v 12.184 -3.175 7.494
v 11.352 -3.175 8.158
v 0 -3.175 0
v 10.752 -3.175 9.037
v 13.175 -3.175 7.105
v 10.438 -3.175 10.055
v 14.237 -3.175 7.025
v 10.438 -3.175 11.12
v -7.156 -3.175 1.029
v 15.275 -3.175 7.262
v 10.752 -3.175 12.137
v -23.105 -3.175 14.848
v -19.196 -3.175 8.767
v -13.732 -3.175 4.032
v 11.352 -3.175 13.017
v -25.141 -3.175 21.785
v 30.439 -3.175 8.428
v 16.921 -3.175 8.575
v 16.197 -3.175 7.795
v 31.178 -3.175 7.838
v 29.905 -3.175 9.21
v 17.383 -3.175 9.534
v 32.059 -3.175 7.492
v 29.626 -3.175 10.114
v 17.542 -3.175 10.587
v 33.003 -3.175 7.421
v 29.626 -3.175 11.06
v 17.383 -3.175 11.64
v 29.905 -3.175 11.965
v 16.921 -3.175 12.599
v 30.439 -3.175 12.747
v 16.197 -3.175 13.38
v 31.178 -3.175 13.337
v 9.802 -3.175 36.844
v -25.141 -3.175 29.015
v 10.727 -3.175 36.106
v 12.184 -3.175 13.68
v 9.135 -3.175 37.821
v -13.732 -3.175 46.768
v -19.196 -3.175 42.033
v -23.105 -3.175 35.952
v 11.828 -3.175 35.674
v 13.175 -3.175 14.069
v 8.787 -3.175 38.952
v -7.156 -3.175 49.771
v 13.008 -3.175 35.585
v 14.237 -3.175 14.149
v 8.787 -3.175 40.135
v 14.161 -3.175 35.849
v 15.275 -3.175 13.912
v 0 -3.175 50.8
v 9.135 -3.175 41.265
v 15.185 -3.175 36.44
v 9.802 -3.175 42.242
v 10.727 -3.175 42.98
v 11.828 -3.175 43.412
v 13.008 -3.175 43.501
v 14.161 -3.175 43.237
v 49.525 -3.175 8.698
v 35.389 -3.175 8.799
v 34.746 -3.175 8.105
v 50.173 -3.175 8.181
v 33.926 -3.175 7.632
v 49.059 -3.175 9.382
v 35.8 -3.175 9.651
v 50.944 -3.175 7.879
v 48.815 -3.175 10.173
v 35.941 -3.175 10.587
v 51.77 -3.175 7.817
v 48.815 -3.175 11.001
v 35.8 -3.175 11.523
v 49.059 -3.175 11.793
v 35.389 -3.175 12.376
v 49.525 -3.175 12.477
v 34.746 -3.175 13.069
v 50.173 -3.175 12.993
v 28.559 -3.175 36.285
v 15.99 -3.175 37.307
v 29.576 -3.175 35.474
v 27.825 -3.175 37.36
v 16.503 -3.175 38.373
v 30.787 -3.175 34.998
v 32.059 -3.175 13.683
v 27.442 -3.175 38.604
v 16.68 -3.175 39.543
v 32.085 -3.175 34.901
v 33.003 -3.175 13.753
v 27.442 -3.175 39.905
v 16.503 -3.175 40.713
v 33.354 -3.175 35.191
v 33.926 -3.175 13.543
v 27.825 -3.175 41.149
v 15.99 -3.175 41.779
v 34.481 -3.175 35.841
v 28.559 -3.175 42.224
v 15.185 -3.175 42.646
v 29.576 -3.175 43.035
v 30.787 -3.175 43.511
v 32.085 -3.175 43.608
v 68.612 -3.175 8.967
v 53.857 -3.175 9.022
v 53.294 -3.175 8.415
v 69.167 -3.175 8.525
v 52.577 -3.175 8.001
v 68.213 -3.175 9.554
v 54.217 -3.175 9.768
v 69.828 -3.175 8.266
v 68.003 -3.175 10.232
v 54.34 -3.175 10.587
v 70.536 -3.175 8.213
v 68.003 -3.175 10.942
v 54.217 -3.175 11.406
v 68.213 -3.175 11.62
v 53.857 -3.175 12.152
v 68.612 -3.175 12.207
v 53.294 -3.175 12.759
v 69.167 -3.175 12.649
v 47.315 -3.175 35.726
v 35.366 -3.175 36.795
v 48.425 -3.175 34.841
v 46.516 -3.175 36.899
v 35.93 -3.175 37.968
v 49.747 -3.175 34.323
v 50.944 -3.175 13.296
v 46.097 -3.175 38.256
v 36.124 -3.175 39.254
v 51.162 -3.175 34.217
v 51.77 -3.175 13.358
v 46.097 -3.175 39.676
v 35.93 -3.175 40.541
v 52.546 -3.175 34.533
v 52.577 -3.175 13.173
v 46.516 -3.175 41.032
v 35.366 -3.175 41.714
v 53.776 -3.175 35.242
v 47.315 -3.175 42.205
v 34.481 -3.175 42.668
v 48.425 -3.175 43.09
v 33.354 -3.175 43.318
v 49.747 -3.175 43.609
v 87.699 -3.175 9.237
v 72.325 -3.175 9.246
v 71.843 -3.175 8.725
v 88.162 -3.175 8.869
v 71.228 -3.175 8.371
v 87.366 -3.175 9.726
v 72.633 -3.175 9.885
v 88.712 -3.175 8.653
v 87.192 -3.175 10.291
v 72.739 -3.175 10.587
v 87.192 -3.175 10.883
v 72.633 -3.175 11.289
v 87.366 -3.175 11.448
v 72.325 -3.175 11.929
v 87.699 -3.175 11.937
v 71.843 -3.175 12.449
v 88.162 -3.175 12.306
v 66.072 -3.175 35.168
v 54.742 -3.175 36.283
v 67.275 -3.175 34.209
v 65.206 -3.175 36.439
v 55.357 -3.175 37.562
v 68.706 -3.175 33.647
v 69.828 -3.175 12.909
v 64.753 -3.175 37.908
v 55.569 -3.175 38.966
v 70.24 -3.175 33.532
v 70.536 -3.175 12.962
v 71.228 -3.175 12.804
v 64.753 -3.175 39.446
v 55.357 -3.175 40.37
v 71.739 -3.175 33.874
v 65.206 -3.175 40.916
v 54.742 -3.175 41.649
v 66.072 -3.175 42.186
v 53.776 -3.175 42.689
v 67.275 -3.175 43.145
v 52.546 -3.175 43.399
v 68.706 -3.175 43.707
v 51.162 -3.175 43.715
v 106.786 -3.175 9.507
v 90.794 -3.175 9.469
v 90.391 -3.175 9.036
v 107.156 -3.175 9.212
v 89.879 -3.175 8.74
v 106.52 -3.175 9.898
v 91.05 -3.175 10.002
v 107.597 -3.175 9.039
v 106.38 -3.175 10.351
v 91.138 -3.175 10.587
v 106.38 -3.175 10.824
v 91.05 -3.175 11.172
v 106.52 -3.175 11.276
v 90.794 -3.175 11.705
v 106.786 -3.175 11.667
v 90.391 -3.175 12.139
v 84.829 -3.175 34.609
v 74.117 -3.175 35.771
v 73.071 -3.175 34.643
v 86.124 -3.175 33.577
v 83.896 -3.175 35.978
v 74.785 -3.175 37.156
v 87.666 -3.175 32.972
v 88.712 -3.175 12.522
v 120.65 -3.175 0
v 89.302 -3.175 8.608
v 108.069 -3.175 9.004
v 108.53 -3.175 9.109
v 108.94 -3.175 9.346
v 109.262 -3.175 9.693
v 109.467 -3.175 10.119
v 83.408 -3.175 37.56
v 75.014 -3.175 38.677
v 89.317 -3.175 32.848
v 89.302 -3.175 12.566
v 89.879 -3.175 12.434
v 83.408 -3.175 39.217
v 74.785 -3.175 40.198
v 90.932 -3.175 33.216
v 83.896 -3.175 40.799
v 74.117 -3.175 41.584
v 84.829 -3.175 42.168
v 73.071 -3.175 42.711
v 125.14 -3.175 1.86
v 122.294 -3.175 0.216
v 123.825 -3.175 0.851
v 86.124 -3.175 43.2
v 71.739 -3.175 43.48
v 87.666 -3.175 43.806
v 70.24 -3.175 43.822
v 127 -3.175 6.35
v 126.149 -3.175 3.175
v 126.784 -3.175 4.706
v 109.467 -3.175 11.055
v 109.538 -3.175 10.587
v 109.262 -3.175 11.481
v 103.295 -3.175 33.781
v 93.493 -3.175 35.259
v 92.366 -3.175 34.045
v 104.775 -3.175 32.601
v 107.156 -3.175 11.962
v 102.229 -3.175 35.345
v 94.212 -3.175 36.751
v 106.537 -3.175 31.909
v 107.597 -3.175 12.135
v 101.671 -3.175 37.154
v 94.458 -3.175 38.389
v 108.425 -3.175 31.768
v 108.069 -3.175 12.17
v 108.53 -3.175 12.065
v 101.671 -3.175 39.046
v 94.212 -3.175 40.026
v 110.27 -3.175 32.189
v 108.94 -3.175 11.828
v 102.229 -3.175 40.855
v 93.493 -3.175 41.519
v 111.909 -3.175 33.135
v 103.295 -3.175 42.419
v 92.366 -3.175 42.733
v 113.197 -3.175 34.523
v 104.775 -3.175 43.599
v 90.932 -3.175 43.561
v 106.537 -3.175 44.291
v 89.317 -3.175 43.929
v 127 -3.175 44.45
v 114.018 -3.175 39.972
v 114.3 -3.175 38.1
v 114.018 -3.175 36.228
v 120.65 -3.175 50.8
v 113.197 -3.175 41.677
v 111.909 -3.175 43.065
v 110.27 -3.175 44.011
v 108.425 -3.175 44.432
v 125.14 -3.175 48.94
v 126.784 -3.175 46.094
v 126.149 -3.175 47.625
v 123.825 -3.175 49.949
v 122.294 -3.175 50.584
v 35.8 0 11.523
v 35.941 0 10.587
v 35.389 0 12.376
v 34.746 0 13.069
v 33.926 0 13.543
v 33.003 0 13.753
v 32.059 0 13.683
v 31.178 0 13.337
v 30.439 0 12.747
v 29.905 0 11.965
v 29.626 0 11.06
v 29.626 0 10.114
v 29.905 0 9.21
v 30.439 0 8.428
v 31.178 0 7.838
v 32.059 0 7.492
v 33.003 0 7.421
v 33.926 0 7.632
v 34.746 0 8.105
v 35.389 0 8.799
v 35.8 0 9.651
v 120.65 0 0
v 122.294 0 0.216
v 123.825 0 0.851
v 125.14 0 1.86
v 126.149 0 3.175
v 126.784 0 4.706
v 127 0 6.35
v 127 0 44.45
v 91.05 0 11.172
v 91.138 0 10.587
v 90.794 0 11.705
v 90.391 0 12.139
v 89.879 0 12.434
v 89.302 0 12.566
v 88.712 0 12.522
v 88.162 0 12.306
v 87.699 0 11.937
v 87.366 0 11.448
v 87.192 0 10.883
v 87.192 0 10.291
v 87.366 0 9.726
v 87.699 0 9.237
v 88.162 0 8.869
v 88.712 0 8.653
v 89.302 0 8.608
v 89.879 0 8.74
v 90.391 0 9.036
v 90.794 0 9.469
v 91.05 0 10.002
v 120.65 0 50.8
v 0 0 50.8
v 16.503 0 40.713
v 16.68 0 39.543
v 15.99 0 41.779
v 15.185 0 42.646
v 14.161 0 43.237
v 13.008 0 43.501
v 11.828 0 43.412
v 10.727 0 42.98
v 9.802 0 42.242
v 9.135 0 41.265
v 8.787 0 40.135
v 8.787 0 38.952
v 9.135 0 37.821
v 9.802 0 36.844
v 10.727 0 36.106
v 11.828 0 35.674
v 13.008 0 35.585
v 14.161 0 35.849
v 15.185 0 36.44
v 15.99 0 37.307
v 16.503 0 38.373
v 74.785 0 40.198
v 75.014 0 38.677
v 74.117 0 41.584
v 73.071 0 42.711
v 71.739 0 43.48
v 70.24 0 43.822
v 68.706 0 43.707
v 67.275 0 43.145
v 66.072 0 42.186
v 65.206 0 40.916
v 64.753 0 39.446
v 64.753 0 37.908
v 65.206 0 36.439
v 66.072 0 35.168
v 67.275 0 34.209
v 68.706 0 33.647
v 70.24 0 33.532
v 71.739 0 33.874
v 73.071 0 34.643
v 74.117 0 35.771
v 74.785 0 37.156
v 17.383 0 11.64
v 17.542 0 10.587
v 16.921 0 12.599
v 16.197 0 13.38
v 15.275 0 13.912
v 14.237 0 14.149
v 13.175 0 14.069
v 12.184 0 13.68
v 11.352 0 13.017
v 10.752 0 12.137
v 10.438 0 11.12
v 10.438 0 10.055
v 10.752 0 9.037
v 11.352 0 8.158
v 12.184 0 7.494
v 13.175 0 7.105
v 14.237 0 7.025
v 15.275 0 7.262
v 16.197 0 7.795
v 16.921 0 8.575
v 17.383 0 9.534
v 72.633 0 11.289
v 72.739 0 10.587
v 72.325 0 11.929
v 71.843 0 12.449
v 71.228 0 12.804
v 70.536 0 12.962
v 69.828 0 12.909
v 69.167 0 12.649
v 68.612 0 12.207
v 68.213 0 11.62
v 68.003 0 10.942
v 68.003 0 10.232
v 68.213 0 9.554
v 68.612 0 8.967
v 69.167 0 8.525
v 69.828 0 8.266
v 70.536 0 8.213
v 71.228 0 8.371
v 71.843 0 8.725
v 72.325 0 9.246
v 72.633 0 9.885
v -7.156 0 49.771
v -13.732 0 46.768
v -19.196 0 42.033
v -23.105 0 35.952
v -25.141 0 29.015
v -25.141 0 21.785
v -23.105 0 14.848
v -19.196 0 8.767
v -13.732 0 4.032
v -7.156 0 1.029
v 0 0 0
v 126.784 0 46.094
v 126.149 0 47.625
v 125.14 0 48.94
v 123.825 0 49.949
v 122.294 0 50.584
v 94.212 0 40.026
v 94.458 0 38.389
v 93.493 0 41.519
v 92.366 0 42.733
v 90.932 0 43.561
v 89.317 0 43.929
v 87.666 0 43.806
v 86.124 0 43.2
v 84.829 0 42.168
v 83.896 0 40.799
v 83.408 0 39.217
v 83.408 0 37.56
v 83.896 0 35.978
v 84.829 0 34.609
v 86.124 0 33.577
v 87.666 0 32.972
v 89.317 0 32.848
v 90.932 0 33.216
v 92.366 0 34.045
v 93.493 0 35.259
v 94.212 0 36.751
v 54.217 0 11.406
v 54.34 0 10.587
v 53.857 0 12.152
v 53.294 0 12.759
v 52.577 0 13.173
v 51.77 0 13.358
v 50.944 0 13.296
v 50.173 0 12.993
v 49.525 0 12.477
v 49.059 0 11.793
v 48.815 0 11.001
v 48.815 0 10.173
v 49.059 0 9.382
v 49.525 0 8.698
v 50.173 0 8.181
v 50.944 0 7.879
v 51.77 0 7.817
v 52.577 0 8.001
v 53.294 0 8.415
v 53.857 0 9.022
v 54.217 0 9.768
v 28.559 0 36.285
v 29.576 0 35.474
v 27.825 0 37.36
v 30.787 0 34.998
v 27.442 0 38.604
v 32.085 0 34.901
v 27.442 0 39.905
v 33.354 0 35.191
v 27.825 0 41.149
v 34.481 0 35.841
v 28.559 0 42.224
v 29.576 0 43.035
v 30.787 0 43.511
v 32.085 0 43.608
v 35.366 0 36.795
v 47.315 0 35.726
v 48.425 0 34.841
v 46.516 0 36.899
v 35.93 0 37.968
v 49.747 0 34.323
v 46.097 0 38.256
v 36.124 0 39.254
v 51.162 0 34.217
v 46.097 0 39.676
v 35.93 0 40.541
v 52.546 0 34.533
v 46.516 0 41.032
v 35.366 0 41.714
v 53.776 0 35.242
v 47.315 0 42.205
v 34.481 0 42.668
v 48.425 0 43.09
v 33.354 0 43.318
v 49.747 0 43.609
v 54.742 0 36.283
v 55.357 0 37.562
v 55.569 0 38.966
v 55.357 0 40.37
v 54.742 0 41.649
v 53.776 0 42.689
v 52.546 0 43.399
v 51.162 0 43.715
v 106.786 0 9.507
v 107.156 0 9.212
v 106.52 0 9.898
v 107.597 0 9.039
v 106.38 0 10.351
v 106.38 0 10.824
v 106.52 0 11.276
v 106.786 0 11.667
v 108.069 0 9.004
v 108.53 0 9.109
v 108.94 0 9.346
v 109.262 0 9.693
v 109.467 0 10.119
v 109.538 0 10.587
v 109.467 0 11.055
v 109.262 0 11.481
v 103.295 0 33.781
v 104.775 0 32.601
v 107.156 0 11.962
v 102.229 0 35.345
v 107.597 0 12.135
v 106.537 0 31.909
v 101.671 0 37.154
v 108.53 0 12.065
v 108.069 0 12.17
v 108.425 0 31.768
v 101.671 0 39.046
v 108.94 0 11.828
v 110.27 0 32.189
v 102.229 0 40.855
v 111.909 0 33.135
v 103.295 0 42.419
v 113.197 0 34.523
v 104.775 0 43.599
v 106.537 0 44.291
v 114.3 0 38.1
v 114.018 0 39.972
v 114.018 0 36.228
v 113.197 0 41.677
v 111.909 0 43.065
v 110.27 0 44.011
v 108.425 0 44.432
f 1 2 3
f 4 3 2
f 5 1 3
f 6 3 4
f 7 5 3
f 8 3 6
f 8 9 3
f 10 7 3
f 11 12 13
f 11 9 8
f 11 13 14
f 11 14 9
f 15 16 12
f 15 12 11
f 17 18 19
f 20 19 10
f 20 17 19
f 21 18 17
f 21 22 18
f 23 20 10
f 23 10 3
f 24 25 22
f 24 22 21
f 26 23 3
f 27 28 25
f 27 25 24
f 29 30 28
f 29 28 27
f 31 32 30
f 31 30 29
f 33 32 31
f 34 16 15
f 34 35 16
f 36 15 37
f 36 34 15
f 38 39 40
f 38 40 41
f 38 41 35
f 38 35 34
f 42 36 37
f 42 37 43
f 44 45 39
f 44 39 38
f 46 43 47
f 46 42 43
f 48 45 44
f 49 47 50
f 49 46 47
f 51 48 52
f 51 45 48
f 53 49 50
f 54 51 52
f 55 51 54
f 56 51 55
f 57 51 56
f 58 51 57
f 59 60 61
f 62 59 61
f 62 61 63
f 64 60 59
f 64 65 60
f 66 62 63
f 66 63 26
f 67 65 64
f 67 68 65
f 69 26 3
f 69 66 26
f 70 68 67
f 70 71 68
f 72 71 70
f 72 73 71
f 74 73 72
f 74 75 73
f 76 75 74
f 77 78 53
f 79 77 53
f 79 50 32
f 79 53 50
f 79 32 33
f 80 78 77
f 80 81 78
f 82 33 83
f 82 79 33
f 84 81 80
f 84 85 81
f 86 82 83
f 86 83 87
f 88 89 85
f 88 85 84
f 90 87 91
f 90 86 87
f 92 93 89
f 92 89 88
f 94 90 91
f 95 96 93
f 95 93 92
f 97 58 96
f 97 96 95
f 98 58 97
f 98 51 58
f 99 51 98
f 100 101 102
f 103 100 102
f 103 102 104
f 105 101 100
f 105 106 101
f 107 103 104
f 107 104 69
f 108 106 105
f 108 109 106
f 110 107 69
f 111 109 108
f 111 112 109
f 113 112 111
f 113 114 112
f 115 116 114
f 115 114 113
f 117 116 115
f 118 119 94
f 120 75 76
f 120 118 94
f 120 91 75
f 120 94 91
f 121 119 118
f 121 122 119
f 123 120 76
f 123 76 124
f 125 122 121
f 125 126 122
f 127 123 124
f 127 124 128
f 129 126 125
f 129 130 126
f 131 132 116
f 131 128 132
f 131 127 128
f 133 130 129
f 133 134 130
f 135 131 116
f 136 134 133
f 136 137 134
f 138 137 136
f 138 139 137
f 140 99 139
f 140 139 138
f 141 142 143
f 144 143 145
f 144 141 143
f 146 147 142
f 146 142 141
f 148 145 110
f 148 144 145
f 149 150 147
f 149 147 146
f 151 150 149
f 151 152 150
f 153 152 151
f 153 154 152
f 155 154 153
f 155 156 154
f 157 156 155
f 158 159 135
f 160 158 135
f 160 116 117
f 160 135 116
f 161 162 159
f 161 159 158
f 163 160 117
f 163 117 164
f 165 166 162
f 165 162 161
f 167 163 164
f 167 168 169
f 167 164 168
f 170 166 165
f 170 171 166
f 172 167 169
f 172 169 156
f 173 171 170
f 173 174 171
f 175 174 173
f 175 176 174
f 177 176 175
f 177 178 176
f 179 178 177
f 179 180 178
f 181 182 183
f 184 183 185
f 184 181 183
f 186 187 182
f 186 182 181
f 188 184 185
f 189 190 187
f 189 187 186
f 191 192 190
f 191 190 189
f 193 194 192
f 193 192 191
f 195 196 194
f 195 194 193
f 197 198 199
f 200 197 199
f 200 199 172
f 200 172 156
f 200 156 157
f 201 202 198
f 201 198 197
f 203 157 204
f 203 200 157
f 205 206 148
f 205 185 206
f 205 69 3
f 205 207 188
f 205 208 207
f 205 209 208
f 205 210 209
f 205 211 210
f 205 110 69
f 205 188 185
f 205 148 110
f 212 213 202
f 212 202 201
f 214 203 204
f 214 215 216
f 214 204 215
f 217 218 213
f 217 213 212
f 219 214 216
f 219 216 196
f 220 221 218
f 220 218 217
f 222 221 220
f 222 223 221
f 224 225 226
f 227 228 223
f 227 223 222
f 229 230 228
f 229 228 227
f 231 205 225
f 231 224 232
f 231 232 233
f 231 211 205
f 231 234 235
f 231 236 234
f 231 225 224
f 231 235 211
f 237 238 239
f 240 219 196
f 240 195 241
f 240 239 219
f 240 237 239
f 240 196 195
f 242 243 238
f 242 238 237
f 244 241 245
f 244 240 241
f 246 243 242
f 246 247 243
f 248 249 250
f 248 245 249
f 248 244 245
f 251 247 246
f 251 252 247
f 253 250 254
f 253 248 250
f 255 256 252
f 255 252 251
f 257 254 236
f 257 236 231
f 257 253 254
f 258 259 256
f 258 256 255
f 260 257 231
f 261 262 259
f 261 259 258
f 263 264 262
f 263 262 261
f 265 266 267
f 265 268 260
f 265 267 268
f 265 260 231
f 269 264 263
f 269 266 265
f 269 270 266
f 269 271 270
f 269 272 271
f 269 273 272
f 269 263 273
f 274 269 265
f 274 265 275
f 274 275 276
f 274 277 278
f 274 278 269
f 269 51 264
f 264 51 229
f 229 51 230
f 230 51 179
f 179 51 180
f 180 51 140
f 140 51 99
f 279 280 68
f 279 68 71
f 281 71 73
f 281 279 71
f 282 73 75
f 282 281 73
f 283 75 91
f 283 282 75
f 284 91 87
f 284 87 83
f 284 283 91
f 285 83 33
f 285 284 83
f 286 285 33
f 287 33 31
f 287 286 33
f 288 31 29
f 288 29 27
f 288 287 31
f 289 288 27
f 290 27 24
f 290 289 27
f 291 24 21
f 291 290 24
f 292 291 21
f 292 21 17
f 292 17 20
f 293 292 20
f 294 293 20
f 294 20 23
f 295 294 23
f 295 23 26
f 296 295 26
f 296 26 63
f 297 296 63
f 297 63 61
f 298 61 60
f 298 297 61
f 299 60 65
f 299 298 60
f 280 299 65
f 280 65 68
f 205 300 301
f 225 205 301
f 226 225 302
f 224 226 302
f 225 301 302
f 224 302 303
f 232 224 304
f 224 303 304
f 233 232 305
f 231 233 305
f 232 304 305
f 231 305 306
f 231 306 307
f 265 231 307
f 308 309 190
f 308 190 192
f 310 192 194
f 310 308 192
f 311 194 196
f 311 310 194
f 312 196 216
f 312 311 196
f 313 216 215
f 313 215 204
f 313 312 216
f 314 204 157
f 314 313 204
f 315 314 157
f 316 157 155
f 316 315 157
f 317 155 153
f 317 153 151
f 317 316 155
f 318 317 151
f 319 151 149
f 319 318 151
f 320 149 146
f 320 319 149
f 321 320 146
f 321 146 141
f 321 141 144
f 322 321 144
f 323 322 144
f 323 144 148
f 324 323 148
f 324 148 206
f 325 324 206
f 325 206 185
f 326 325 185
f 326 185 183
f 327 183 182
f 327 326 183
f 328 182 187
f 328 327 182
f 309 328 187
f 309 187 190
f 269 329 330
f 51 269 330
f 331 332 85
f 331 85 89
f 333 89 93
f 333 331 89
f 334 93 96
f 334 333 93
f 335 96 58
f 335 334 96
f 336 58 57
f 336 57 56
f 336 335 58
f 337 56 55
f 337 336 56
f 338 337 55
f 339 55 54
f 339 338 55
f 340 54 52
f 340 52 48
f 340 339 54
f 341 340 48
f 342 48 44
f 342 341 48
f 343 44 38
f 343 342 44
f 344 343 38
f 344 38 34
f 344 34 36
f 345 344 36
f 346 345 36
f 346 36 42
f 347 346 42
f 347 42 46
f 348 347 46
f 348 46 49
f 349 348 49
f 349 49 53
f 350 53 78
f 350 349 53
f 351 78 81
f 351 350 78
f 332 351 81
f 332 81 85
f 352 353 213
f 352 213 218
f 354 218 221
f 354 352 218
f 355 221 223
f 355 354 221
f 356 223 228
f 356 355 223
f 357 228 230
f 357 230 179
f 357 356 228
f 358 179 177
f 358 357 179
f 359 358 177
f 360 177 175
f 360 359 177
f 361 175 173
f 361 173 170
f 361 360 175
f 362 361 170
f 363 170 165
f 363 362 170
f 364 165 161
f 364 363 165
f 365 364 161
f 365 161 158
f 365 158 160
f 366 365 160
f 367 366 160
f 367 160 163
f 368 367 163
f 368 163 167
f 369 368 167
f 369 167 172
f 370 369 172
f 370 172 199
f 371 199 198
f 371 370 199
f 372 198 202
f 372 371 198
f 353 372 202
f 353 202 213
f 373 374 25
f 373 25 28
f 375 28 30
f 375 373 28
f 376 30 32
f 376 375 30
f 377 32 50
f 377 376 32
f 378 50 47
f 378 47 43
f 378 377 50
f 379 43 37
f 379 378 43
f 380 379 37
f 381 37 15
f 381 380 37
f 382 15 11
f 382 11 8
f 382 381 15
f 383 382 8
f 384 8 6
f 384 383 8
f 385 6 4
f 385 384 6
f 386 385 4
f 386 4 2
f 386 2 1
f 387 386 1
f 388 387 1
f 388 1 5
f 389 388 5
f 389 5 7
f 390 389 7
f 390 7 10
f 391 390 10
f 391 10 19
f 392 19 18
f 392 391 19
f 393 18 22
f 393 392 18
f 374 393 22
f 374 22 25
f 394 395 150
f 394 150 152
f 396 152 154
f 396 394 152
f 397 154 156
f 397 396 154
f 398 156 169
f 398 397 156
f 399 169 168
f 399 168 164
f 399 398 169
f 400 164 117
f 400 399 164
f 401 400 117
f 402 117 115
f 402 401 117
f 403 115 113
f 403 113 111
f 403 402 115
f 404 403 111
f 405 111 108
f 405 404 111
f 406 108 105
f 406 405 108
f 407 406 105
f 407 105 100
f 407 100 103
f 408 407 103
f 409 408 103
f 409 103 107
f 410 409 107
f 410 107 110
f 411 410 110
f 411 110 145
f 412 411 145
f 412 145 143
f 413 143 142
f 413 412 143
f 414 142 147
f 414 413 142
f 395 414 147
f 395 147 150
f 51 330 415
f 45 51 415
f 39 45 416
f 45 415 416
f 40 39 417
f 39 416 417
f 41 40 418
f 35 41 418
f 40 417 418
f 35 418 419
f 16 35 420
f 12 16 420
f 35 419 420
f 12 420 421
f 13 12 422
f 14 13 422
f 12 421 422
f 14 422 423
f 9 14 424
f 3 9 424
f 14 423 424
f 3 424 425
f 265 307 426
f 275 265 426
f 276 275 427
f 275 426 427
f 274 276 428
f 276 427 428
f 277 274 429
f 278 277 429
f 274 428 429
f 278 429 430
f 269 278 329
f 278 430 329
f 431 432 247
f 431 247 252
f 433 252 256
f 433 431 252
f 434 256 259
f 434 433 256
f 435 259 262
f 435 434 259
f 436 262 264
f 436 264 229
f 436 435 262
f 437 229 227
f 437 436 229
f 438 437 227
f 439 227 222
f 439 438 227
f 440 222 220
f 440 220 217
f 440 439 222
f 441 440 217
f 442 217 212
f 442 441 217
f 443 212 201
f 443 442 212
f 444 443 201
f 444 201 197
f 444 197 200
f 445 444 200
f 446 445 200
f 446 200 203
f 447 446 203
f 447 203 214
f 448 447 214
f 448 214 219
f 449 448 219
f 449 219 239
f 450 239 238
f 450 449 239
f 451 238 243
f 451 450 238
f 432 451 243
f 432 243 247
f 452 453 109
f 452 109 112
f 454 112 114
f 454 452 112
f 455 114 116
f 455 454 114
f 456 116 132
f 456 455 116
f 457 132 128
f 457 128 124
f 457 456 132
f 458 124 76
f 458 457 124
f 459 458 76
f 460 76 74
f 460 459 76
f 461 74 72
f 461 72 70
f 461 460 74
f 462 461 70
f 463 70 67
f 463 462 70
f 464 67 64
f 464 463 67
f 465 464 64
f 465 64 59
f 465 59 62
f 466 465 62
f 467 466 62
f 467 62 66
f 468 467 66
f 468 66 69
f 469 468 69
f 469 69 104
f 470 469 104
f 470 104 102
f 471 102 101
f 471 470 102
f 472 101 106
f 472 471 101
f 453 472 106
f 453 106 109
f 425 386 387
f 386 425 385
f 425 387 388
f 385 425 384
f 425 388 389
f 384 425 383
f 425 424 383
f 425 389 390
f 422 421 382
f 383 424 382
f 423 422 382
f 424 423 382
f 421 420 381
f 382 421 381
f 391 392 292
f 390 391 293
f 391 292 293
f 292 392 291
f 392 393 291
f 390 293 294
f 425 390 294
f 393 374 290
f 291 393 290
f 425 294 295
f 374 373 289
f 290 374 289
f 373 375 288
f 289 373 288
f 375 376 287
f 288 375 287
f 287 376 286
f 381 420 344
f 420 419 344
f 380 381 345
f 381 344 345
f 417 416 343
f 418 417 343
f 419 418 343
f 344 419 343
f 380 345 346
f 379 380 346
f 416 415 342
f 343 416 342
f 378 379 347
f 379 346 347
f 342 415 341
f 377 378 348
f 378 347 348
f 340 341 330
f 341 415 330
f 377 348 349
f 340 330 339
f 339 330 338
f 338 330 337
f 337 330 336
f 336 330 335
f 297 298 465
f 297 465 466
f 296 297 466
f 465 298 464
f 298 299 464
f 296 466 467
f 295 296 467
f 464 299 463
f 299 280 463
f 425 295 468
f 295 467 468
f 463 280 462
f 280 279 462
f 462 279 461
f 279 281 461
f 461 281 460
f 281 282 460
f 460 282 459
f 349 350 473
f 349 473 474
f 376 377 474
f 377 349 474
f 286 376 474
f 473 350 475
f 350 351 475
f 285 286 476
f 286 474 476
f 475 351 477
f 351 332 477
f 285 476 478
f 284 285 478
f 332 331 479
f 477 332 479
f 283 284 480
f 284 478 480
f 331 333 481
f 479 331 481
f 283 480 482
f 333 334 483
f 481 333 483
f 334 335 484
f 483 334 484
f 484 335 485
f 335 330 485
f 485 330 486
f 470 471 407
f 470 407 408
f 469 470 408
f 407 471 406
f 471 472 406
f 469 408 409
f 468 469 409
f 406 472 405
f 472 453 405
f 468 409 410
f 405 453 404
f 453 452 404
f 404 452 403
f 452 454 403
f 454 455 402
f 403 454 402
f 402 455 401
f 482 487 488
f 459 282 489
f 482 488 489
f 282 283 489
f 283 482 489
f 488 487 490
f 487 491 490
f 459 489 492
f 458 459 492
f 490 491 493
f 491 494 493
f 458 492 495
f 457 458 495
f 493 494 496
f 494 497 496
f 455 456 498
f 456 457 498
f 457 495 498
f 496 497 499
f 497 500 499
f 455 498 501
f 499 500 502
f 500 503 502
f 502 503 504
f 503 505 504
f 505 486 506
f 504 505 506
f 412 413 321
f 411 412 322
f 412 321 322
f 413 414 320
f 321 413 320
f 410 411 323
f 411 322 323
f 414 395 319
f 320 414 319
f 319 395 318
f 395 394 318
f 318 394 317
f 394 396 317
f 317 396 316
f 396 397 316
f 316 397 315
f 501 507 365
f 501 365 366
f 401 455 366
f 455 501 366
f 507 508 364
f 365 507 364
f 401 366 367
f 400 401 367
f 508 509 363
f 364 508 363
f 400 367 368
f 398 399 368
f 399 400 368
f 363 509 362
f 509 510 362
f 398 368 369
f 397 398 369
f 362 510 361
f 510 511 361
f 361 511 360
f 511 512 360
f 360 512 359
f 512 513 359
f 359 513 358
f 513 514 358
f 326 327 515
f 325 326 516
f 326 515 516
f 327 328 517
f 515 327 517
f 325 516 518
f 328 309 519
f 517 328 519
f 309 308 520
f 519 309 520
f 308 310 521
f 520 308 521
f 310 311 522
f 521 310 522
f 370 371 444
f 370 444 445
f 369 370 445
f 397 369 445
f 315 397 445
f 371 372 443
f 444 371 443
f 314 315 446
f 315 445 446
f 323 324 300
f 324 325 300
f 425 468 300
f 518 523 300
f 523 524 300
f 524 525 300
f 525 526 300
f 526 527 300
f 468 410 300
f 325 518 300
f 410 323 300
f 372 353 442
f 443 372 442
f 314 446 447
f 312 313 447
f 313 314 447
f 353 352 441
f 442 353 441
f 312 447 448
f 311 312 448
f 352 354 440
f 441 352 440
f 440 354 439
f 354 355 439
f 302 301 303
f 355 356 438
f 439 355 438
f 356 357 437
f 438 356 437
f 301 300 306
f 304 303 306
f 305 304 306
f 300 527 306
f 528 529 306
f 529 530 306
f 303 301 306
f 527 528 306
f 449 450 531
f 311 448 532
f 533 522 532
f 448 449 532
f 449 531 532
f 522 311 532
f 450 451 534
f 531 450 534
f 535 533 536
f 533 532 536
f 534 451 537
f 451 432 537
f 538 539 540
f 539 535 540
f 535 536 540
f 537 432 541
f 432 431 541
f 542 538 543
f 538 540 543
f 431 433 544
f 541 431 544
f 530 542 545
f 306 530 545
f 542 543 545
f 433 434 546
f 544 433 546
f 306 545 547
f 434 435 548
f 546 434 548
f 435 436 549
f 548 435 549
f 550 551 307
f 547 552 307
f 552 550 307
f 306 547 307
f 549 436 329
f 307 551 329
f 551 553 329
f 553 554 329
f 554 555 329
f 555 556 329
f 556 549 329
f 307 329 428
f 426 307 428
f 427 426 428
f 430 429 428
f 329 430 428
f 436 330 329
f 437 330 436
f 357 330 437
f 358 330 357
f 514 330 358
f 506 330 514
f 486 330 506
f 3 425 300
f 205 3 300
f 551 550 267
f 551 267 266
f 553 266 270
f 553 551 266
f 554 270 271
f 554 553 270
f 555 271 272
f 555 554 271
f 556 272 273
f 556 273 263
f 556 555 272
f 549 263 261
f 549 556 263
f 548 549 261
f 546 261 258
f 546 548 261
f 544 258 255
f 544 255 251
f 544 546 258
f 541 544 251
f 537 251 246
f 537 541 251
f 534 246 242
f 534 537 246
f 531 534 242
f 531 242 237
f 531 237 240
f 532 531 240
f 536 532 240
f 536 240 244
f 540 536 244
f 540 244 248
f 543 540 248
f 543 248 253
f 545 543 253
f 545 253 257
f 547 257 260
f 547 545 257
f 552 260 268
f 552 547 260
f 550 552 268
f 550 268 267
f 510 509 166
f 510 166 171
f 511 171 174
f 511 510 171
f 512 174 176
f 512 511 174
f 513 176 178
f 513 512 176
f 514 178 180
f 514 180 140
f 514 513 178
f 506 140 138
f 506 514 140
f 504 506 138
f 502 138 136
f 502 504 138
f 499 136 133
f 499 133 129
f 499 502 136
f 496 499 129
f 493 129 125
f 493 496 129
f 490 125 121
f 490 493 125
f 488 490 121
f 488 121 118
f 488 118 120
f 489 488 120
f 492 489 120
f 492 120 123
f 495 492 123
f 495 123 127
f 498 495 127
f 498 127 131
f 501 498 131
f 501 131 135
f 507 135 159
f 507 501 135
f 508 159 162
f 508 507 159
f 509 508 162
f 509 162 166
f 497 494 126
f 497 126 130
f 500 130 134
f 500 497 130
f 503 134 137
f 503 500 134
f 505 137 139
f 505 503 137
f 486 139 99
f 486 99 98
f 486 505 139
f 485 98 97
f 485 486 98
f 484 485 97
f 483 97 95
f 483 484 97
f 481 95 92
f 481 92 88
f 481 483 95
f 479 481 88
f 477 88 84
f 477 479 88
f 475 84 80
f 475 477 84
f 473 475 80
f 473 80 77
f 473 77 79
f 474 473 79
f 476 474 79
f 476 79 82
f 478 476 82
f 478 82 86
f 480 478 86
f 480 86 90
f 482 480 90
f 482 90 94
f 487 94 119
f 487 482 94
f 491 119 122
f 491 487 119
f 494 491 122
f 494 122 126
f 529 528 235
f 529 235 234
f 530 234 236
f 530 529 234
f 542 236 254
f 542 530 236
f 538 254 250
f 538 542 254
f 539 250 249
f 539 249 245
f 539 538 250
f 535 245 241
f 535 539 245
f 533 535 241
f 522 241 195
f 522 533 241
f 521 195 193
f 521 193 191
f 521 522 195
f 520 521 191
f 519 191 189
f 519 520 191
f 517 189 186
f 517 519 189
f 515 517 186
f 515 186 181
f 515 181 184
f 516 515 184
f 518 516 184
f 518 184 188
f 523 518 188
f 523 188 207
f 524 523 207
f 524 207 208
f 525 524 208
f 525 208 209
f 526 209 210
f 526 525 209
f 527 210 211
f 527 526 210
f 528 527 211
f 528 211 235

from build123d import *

# Parameters (mm, degrees)
F0_R     = 3.571875
F0_R_2   = 3.175
F0_R_3   = 2.778125
F0_R_4   = 2.38125
F0_R_5   = 1.984375
F0_R_6   = 1.5875
F0_R_7   = 3.96875
F0_R_8   = 4.365625
F0_R_9   = 4.7625
F0_R_10  = 5.159375
F0_R_11  = 5.55625
F0_R_12  = 6.35
F1_DEPTH = 3.175


# Not quite as in the source:
# - a length typed as a fraction of an inch, garbled in the dataset ("3 / 203.2 mm" for 3/8 in), is restored


with BuildPart() as f1:
    # F0 (on Front) → F1 (new body)
    with BuildSketch(Plane.XZ):
        with BuildLine():
            Line((0, 50.8), (0, 0))
            Line((0, 0), (120.65, 0))
            ThreePointArc((120.65, 0), (125.1401280605, 1.8598719395), (127, 6.35))
            Line((127, 6.35), (127, 44.45))
            ThreePointArc((127, 44.45), (125.1401280605, 48.9401280605), (120.65, 50.8))
            Line((120.65, 50.8), (0, 50.8))
        make_face()
        with Locations((13.97, 10.5871595442)):
            Circle(F0_R, mode=Mode.SUBTRACT)
        with Locations((32.766, 10.5871595442)):
            Circle(F0_R_2, mode=Mode.SUBTRACT)
        with Locations((51.562, 10.5871595442)):
            Circle(F0_R_3, mode=Mode.SUBTRACT)
        with Locations((70.358, 10.5871595442)):
            Circle(F0_R_4, mode=Mode.SUBTRACT)
        with Locations((89.154, 10.5871595442)):
            Circle(F0_R_5, mode=Mode.SUBTRACT)
        with Locations((107.95, 10.5871595442)):
            Circle(F0_R_6, mode=Mode.SUBTRACT)
        with Locations((12.7109313135, 39.5430161922)):
            Circle(F0_R_7, mode=Mode.SUBTRACT)
        with Locations((31.7587450508, 39.2544129538)):
            Circle(F0_R_8, mode=Mode.SUBTRACT)
        with Locations((50.8065587881, 38.9658097153)):
            Circle(F0_R_9, mode=Mode.SUBTRACT)
        with Locations((69.8543725254, 38.6772064769)):
            Circle(F0_R_10, mode=Mode.SUBTRACT)
        with Locations((88.9021862627, 38.3886032384)):
            Circle(F0_R_11, mode=Mode.SUBTRACT)
        with Locations((107.95, 38.1)):
            Circle(F0_R_12, mode=Mode.SUBTRACT)
        with BuildLine():
            ThreePointArc((0, 50.8), (-25.4, 25.4), (0, 0))
            Line((0, 0), (0, 50.8))
        make_face()
    extrude(amount=F1_DEPTH)


solid = f1.part
